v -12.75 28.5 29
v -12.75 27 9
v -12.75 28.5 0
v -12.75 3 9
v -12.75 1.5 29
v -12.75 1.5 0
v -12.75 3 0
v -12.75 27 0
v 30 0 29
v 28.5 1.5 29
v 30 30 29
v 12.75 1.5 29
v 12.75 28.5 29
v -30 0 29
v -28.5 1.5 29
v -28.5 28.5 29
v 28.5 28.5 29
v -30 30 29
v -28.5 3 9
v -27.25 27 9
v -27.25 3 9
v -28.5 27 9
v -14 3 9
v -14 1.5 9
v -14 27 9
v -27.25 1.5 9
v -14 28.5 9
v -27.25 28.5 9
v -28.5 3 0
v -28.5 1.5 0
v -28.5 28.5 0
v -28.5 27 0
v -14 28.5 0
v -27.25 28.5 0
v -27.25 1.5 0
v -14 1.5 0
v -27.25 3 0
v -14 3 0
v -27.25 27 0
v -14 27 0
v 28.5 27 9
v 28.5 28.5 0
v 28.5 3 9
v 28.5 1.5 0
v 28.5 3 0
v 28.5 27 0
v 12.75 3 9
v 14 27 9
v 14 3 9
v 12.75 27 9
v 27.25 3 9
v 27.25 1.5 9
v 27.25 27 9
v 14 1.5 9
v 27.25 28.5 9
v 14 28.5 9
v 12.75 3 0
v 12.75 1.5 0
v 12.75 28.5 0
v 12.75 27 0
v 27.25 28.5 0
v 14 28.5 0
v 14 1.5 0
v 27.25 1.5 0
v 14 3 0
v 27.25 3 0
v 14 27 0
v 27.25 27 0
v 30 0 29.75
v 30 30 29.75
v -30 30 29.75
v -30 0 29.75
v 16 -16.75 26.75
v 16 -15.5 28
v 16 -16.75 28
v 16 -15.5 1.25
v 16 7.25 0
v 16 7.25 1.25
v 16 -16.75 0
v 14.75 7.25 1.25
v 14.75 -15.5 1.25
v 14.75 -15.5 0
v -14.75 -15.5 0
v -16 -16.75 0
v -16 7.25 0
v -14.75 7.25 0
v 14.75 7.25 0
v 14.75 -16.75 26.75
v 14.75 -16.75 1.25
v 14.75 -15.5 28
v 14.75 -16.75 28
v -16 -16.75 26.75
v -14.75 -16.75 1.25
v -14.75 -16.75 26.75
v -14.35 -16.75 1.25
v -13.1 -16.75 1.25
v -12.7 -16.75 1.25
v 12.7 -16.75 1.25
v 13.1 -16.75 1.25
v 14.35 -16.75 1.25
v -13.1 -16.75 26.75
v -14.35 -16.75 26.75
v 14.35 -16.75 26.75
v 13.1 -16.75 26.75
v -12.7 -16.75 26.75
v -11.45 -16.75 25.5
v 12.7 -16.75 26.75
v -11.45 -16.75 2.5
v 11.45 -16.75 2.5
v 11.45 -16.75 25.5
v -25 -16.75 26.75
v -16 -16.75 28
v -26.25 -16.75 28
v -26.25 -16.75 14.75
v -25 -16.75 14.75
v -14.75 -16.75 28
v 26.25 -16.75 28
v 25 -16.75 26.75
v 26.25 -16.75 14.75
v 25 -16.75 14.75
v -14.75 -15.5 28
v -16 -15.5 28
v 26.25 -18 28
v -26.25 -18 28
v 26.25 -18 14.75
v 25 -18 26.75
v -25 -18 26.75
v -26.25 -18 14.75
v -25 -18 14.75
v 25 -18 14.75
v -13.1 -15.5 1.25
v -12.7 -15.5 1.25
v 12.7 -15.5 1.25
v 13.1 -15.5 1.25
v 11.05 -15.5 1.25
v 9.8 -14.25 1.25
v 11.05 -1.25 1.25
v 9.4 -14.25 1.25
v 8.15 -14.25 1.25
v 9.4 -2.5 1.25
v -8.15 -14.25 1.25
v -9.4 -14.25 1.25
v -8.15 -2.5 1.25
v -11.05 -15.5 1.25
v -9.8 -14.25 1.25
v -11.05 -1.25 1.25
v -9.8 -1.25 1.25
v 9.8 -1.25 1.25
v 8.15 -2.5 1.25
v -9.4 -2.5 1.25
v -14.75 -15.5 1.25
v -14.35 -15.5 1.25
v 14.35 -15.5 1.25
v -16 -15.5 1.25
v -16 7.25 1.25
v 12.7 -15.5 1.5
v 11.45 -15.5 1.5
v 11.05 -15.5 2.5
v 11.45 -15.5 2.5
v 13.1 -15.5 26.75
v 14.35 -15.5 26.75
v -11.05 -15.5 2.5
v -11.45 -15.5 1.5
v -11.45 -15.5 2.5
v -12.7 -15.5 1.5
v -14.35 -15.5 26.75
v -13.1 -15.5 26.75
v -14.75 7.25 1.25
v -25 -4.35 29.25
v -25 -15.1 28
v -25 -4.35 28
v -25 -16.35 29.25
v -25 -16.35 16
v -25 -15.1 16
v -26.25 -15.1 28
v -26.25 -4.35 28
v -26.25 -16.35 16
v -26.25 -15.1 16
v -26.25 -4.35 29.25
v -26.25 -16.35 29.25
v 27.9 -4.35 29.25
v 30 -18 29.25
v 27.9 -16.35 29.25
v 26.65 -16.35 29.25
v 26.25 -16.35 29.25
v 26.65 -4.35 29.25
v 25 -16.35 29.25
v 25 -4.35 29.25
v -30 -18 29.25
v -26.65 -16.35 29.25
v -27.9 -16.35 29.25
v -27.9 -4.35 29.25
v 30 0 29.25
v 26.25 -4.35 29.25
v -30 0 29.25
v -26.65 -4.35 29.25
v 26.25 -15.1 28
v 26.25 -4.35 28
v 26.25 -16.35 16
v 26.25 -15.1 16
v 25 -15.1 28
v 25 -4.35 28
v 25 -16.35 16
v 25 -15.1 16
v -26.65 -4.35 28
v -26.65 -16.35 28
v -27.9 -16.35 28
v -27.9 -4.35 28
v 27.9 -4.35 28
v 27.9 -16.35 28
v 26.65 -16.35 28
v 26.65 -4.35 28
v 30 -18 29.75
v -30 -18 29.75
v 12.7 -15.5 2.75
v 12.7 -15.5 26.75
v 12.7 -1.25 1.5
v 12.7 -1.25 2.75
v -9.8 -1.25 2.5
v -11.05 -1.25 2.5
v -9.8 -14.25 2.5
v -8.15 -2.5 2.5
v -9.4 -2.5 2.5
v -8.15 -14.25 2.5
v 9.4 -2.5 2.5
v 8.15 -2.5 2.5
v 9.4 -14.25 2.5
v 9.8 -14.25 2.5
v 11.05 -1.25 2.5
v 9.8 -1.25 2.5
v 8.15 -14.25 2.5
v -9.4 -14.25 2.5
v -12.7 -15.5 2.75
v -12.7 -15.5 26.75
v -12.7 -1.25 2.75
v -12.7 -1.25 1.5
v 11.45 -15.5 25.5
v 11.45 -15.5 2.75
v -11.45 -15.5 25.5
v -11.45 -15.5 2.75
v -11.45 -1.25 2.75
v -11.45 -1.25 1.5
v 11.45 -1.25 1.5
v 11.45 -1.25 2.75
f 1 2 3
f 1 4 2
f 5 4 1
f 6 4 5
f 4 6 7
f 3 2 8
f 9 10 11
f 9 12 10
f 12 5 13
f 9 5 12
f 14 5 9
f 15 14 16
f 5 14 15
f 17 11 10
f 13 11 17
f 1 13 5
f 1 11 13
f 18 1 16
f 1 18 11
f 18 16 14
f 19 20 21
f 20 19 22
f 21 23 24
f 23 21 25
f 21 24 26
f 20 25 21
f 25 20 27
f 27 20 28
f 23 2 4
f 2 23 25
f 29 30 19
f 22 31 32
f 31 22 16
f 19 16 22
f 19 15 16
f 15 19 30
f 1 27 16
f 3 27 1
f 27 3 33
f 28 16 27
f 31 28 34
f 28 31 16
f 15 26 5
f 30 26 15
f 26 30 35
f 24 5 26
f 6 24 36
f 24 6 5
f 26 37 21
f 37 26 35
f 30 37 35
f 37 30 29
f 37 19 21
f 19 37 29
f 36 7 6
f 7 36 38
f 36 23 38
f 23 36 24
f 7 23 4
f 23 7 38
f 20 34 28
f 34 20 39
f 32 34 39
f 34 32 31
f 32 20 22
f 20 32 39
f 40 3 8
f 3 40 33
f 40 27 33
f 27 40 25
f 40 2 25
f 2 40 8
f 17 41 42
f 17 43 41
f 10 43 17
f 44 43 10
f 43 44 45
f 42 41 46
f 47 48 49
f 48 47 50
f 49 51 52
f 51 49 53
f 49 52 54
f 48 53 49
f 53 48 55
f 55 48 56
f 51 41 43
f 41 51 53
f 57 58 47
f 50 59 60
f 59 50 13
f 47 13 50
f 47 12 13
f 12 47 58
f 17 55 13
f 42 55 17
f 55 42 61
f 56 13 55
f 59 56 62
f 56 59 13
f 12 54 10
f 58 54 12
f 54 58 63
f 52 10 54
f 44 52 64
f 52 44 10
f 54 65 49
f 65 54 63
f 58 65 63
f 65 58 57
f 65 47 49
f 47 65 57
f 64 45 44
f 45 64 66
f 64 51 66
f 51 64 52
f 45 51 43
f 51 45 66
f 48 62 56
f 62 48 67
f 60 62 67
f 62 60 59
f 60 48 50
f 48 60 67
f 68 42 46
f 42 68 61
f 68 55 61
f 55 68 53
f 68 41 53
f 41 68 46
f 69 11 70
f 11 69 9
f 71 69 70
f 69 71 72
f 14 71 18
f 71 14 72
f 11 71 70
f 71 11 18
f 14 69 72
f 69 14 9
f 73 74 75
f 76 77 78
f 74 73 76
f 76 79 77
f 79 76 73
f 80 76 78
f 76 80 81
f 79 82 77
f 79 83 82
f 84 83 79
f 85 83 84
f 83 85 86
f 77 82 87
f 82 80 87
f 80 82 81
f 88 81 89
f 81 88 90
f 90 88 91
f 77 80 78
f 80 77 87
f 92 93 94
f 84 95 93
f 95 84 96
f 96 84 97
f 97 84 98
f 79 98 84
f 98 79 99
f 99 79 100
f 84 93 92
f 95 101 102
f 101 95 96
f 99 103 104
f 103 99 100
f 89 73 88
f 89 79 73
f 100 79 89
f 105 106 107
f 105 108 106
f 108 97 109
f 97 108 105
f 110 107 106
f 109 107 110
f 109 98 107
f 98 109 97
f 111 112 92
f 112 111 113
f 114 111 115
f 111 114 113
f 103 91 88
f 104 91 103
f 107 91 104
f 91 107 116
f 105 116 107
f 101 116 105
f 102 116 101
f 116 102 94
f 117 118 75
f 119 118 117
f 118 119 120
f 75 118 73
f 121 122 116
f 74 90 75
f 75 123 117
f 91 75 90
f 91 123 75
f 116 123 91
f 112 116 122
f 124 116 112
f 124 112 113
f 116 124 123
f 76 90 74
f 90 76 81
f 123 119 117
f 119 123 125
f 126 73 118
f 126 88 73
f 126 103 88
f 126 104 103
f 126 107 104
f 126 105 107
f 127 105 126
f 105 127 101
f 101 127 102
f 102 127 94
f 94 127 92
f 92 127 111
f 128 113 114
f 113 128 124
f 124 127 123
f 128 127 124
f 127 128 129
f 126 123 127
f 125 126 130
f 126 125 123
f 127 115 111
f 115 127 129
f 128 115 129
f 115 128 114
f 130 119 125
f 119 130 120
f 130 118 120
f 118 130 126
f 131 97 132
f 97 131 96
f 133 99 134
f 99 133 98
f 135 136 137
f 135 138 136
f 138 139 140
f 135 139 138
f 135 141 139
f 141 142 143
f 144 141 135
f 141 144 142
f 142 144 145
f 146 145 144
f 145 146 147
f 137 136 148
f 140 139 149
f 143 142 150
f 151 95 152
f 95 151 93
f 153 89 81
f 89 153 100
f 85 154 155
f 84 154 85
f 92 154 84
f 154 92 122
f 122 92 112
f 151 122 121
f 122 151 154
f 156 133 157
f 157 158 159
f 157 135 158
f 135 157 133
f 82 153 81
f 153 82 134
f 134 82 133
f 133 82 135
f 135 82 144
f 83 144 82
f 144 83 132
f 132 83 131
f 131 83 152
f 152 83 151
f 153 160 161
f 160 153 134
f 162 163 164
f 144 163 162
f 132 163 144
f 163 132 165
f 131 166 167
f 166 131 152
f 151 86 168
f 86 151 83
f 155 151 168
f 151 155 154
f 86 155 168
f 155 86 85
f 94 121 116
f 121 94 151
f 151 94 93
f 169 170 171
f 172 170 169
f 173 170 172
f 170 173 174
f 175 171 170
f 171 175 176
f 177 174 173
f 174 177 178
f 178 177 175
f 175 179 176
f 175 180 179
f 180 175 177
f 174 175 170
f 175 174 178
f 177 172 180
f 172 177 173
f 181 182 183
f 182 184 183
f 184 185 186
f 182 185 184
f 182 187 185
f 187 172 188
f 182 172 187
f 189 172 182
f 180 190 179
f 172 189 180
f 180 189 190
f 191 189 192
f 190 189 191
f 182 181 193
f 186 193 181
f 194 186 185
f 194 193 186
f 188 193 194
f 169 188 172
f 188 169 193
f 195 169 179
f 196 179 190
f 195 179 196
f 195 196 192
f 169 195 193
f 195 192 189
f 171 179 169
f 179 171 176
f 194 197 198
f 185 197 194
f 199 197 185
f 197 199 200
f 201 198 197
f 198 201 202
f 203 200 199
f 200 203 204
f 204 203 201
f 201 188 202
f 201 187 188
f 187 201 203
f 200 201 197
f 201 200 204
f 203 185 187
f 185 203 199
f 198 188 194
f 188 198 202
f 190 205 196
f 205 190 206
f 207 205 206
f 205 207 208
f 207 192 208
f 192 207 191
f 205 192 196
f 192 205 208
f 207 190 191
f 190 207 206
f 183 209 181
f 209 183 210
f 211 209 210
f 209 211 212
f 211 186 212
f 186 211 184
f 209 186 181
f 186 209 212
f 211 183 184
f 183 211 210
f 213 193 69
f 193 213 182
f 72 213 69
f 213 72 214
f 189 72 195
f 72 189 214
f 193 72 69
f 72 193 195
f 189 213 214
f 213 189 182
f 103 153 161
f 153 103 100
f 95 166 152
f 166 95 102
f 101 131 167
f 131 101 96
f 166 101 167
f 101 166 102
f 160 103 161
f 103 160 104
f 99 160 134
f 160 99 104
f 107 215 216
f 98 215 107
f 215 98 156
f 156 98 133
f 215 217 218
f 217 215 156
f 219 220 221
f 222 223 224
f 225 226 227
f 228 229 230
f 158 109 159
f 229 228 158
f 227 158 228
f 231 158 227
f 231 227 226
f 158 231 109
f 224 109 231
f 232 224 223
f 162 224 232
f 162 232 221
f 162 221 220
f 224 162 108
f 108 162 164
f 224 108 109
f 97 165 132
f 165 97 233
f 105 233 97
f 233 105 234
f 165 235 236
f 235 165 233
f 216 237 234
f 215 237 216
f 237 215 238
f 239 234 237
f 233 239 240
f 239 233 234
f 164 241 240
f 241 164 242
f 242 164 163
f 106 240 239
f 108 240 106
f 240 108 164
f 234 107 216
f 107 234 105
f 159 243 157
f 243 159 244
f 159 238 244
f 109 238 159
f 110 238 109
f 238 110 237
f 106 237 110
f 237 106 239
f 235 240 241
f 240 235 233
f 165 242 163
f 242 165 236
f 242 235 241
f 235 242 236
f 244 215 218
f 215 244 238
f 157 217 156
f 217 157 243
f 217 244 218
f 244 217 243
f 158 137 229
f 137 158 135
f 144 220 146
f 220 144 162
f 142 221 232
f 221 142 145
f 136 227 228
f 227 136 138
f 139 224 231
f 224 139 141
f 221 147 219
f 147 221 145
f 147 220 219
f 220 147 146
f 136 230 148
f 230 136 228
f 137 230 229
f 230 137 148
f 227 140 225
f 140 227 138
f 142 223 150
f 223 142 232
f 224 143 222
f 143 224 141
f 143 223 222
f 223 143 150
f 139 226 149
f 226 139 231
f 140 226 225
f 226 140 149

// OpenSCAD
// file: dimensions.scad
// Dimensions in inches, the way it was made

top_width     = 60;
top_depth     = 30;
top_thickness = 0.75;
top_overhang  = 1.5;

leg_length = 29;
leg_width  = 1.25;
leg_depth  = 1.5;

plinth_width  = 15.75;
plinth_depth  = 27;
plinth_height = 20;

strut_size  = 1.25;             /* actually 30mm */

rear_box_depth = 18;
rear_frame_depth = rear_box_depth - strut_size;

full_extension = 3.0 / 4.0;

cover_frame_width = top_width - strut_size * 6;
cover_lift_depth = 12;
cover_lift_max = cover_lift_depth * full_extension;

cover_thickness = 0.5;

base_height = 28;
base_width  = 32;               /* will need adjusting */
foot_length = 24;

slider_thickness = 0.4;         /* measure when I get some */

cover_slide_max = rear_box_depth * full_extension;

carrier_width = base_width - (strut_size + slider_thickness) * 2;
carrier_height = base_height - strut_size;
carrier_max = carrier_height * full_extension;

monitor_bank_depth = 24;        /* top of desk to top of monitor */

riser_width = carrier_width - (strut_size + slider_thickness) * 2;
riser_height = carrier_height - strut_size;
riser_depth = rear_frame_depth - strut_size;
riser_max = riser_height * full_extension;

fork_width = riser_width  - (strut_size + slider_thickness) * 2;
fork_depth = riser_depth - strut_size;
fork_max = fork_depth * full_extension;

jib_width = fork_width - (strut_size + slider_thickness) * 2;
jib_depth = fork_depth - strut_size;
jib_max = jib_depth * full_extension;
// file: lift.scad
include <dimensions.scad>

module base(cover_h, cover_v, h_position, v_position) {
     translate([-base_width/2, 0, 0]) {
          color("blue")
               union() {
               cube([base_width, strut_size, strut_size]);
               cube([strut_size, foot_length, strut_size]);
               cube([strut_size, strut_size, base_height]);
               translate([base_width-strut_size, 0, 0]) {
                    cube([strut_size, foot_length, strut_size]);
                    cube([strut_size, strut_size, base_height]);
               }
               /* the cover lift supports */
               translate([-(cover_frame_width-base_width)/2, -strut_size, base_height-strut_size]) {
                    cube([cover_frame_width, strut_size, strut_size]);
                    translate([0, 0, -cover_lift_depth ]) cube([strut_size, strut_size, cover_lift_depth]);
                    translate([cover_frame_width-strut_size, 0, -cover_lift_depth ]) cube([strut_size, strut_size, cover_lift_depth]);
               }
          }
     }
     cover_lift(cover_h, cover_v);
     carrier(h_position, v_position);
}

module cover_lift(cover_h, cover_v) {
     translate([-cover_frame_width/2, slider_thickness, cover_v * cover_lift_max + base_height]) {
          color("cyan") {
               translate([0, 0, -cover_lift_depth ]) cube([strut_size, strut_size, cover_lift_depth]);
               translate([0, 0, 0]) cube([strut_size, cover_lift_depth, strut_size]);
               translate([cover_frame_width-strut_size, 0, -cover_lift_depth ]) cube([strut_size, strut_size, cover_lift_depth]);
               translate([cover_frame_width-strut_size, 0, 0]) cube([strut_size, cover_lift_depth, strut_size]);
          }
          cover_carrier(cover_h);
     }
}

module cover_carrier(cover_h) {
     translate([-(slider_thickness + strut_size), cover_h * cover_slide_max, 0]) cube([strut_size, cover_lift_depth, strut_size]);
     translate([cover_frame_width + slider_thickness, cover_h * cover_slide_max, 0]) cube([strut_size, cover_lift_depth, strut_size]);
     translate([(cover_frame_width - top_width)/2, cover_h * cover_slide_max - strut_size - slider_thickness, 0]) cover();
}

module cover() {
     translate([0, 0, strut_size]) cube([top_width, rear_box_depth, cover_thickness]);
}

module carrier(h_position, v_position) {
     translate([-carrier_width/2, 0, v_position*carrier_max/2]) {
          color("yellow")
               union() {
               cube([carrier_width, strut_size, strut_size]);
               cube([strut_size, strut_size, carrier_height]);
               translate([carrier_width-strut_size, 0, 0]) cube([strut_size, strut_size, carrier_height]);
          }
     }
     riser(h_position, v_position);
}

module riser(h_position, v_position) {
     translate([-riser_width/2, 0, strut_size + v_position*riser_max]) {
          color("green") union() {
               cube([riser_width, strut_size, strut_size]);
               cube([strut_size, strut_size, riser_height]);
               translate([riser_width-strut_size, 0, 0]) cube([strut_size, strut_size, riser_height]);
               translate([0, 0, riser_height-strut_size]) cube([riser_width, strut_size, strut_size]);
               translate([0, 0, riser_height-strut_size-monitor_bank_depth]) cube([strut_size, riser_depth, strut_size]);
               translate([riser_width-strut_size, 0, riser_height-strut_size-monitor_bank_depth]) cube([strut_size, riser_depth, strut_size]);
          }
     }
     translate([0, 0, strut_size + v_position*riser_max]) fork(h_position);
}

module fork(h_position) {
     translate([-fork_width/2, h_position*fork_max/2+strut_size, 0]) {
          cube([fork_width, strut_size, strut_size]);
          cube([strut_size, fork_depth, strut_size]);
          translate([fork_width-strut_size, 0, 0]) cube([strut_size, fork_depth, strut_size]);
     }
     jib(h_position);
}

module jib(h_position) {
     color("red")
          translate([-jib_width/2, h_position*jib_max+strut_size, 0]) {
          cube([jib_width, strut_size, strut_size]);
          cube([strut_size, jib_depth, strut_size]);
          translate([jib_width-strut_size, 0, 0]) cube([strut_size, jib_depth, strut_size]);
     }
}
// file: desk.scad
include <dimensions.scad>

module leg() {
       cube([leg_width, leg_depth, leg_length]);
}

module plinth() {
     union() {
          translate ([0, 0, leg_length-plinth_height]) cube([plinth_width, plinth_depth, plinth_height]);
          leg();
          translate([plinth_width - leg_width, 0, 0]) leg();
          translate([0, plinth_depth - leg_depth, 0]) leg();
          translate([plinth_width - leg_width, plinth_depth - leg_depth, 0]) leg();
     }
}

module desk() {
     half_width = top_width / 2;
     translate([top_overhang-half_width, top_overhang, 0]) plinth();
     translate([half_width-top_overhang-plinth_width, top_overhang, 0]) plinth();
     translate([-half_width, 0, leg_length]) cube([top_width, top_depth, top_thickness]);
}
// main file
include <desk.scad>
include <lift.scad>

stages = [ 0.0, 0.1, 0.2, 0.3, 0.5, 0.8, 1.0];

/* which of a series of stages a value is in */
function stage(stages, threshold, i) =
     ((i >= len(stages))
      ? i : (stages[i] > threshold
             ? i-1
             : stage(stages, threshold, i+1)));

/* how far through its stage a value is */
function offset_in_stage(stages, f, stage) =
     max(0, min(1, (f - stages[stage]) / (stages[stage+1] - stages[stage])));

/* return the position of something that moves in stage m, when the variable is f */
function position(stages, m, f) = (let (s = stage(stages, f, 0))
                          m < s ? 0 : (m > s ? 1 : offset_in_stage(stages, f, s)));

i = 0;
f = 0;
echo("mover in stage", i, "control variable", f, "which is in stage", stage(stages, f, 0), "at position", position(stages, i, f));

t = 1;
color("brown") desk();
translate([0, -rear_frame_depth, 0]) base(position(stages, 1, t),
                                          position(stages, 0, t),
                                          position(stages, 3, t),
                                          position(stages, 2, t));
